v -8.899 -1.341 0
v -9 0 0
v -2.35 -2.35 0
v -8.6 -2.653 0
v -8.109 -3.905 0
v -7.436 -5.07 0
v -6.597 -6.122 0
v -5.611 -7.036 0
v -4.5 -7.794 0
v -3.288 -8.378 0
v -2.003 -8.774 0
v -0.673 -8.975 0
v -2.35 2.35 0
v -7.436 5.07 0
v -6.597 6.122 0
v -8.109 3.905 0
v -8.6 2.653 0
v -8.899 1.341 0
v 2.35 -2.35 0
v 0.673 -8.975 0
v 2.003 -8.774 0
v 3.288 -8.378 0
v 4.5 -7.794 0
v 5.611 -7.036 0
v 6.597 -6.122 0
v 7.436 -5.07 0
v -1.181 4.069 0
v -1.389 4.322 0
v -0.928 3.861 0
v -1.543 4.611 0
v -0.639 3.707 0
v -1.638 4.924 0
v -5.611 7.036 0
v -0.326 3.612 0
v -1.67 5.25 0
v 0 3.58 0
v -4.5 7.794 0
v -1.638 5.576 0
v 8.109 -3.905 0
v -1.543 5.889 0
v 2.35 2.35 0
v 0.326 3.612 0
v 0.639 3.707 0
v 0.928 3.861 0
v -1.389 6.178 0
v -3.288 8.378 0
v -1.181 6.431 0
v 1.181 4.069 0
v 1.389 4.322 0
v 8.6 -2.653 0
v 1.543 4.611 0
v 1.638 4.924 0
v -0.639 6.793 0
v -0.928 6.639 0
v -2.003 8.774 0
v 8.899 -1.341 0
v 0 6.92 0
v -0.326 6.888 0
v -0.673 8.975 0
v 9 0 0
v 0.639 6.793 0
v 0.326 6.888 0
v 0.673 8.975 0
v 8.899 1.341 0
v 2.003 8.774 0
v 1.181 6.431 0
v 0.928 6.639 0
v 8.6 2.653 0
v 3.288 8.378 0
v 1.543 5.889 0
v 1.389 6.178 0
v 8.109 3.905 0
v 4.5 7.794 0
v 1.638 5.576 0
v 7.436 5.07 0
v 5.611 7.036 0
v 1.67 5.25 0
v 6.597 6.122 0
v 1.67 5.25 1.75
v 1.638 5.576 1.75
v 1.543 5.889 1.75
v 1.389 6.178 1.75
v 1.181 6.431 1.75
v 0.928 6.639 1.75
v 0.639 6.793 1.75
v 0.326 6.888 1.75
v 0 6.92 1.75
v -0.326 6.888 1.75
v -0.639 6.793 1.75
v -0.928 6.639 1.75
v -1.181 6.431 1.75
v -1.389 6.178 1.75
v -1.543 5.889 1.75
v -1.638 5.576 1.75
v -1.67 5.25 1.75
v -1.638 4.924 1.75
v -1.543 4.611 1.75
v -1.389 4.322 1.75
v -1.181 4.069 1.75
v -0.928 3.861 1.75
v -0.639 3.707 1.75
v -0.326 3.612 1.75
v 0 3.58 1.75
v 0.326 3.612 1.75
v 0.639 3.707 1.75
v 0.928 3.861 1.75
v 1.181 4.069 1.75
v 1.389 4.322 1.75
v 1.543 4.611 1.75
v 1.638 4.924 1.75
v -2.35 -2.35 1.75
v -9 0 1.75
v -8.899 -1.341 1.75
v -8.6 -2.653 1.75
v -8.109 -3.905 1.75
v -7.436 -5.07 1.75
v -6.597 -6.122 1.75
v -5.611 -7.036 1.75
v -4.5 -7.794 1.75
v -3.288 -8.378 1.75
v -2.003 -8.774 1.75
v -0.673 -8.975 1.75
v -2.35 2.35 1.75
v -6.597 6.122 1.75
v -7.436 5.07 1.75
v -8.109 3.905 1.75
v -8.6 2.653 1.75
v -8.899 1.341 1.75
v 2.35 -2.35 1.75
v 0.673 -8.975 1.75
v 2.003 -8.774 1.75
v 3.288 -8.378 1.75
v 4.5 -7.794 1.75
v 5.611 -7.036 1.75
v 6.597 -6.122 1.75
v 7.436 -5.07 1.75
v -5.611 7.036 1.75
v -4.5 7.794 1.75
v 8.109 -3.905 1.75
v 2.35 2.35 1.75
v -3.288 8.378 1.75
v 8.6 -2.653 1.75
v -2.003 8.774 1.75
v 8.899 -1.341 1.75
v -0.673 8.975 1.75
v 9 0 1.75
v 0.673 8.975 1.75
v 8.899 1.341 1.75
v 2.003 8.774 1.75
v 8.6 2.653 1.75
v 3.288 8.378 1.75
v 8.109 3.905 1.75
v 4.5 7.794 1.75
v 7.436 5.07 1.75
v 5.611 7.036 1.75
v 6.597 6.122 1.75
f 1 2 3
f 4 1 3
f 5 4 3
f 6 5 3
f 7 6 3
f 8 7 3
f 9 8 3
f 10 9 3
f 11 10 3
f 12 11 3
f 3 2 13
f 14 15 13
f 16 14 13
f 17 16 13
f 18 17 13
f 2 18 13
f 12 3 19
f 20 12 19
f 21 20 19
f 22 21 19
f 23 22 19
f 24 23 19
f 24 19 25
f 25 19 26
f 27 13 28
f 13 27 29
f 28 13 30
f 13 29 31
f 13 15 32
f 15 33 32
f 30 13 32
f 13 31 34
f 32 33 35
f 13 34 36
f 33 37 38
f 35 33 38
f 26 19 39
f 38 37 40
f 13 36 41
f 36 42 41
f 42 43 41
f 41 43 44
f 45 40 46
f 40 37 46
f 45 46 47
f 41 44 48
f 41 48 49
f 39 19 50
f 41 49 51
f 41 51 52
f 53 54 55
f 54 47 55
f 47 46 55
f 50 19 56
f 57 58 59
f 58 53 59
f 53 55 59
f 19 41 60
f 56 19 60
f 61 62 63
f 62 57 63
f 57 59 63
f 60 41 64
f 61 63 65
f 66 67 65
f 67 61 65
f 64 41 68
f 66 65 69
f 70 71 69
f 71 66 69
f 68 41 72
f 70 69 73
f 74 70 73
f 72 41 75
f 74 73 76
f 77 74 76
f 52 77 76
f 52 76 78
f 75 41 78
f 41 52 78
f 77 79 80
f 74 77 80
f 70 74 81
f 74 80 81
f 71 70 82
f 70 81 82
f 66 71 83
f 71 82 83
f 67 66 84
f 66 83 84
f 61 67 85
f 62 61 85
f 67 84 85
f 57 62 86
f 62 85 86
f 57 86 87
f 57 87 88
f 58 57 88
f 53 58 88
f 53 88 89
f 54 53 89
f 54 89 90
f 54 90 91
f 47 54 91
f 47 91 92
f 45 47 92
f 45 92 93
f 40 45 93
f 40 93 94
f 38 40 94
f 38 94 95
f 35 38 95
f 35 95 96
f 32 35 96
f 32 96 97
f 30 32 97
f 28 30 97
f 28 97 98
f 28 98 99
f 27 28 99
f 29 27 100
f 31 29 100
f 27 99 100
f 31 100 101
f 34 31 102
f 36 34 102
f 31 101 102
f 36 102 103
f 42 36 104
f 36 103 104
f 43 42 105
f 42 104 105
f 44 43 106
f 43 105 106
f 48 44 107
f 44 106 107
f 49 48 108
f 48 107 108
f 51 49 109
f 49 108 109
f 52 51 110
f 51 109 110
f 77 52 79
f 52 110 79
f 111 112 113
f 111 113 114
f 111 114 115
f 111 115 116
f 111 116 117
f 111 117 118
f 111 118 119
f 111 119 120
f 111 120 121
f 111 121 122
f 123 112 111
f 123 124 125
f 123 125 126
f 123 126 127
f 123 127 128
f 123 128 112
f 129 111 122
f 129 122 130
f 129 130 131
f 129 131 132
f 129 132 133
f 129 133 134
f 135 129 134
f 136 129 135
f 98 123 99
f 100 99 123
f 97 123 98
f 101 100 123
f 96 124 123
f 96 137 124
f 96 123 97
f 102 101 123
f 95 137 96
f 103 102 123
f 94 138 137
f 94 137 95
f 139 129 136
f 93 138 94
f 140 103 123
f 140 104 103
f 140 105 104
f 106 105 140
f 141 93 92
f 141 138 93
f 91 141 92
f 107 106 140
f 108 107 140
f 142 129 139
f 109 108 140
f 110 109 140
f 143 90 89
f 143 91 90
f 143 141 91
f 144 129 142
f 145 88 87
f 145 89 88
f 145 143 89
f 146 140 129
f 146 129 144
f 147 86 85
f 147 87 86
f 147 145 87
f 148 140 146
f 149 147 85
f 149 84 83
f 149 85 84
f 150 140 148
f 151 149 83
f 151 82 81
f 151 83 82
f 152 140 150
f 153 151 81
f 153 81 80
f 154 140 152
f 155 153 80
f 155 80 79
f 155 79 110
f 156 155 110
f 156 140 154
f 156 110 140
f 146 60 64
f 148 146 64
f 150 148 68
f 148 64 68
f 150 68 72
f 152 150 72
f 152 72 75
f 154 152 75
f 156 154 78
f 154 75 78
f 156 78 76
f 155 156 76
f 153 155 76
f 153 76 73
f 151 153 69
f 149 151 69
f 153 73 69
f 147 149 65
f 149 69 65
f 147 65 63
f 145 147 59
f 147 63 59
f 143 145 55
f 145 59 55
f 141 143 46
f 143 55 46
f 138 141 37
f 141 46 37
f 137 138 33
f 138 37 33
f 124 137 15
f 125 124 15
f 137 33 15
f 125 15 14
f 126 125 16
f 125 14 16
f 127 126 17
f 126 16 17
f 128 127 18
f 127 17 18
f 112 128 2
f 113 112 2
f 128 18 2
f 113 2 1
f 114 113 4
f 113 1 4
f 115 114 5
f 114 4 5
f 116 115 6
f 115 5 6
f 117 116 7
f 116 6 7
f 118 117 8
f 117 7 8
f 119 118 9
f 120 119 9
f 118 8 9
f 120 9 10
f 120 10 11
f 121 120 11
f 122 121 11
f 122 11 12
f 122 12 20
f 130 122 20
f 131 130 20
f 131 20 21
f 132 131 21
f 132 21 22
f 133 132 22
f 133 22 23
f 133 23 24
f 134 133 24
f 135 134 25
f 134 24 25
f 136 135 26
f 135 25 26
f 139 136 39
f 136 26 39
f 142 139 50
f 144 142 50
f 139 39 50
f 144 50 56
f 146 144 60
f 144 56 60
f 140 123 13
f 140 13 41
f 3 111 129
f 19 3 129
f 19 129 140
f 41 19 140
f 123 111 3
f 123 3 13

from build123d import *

# Parameters (mm, degrees)
SKETCH1_R           = 9
BOSS_EXTRUDE1_DEPTH = 1.75
SKETCH2_R           = 1.67
SKETCH2_W           = 4.7
SKETCH2_H           = 4.7
CUT_EXTRUDE1_DEPTH  = 2.75


with BuildPart() as part:
    # Sketch1 → Boss-Extrude1 (new body)
    with BuildSketch(Plane.XY):
        Circle(SKETCH1_R)
    extrude(amount=BOSS_EXTRUDE1_DEPTH)

    # Sketch2 → Cut-Extrude1 (cut, through all)
    with BuildSketch(Plane.XY.offset(1.75)):
        with Locations((0, 5.25)):
            Circle(SKETCH2_R)
        Rectangle(SKETCH2_W, SKETCH2_H)
    extrude(amount=-CUT_EXTRUDE1_DEPTH, mode=Mode.SUBTRACT)


solid = part.part
